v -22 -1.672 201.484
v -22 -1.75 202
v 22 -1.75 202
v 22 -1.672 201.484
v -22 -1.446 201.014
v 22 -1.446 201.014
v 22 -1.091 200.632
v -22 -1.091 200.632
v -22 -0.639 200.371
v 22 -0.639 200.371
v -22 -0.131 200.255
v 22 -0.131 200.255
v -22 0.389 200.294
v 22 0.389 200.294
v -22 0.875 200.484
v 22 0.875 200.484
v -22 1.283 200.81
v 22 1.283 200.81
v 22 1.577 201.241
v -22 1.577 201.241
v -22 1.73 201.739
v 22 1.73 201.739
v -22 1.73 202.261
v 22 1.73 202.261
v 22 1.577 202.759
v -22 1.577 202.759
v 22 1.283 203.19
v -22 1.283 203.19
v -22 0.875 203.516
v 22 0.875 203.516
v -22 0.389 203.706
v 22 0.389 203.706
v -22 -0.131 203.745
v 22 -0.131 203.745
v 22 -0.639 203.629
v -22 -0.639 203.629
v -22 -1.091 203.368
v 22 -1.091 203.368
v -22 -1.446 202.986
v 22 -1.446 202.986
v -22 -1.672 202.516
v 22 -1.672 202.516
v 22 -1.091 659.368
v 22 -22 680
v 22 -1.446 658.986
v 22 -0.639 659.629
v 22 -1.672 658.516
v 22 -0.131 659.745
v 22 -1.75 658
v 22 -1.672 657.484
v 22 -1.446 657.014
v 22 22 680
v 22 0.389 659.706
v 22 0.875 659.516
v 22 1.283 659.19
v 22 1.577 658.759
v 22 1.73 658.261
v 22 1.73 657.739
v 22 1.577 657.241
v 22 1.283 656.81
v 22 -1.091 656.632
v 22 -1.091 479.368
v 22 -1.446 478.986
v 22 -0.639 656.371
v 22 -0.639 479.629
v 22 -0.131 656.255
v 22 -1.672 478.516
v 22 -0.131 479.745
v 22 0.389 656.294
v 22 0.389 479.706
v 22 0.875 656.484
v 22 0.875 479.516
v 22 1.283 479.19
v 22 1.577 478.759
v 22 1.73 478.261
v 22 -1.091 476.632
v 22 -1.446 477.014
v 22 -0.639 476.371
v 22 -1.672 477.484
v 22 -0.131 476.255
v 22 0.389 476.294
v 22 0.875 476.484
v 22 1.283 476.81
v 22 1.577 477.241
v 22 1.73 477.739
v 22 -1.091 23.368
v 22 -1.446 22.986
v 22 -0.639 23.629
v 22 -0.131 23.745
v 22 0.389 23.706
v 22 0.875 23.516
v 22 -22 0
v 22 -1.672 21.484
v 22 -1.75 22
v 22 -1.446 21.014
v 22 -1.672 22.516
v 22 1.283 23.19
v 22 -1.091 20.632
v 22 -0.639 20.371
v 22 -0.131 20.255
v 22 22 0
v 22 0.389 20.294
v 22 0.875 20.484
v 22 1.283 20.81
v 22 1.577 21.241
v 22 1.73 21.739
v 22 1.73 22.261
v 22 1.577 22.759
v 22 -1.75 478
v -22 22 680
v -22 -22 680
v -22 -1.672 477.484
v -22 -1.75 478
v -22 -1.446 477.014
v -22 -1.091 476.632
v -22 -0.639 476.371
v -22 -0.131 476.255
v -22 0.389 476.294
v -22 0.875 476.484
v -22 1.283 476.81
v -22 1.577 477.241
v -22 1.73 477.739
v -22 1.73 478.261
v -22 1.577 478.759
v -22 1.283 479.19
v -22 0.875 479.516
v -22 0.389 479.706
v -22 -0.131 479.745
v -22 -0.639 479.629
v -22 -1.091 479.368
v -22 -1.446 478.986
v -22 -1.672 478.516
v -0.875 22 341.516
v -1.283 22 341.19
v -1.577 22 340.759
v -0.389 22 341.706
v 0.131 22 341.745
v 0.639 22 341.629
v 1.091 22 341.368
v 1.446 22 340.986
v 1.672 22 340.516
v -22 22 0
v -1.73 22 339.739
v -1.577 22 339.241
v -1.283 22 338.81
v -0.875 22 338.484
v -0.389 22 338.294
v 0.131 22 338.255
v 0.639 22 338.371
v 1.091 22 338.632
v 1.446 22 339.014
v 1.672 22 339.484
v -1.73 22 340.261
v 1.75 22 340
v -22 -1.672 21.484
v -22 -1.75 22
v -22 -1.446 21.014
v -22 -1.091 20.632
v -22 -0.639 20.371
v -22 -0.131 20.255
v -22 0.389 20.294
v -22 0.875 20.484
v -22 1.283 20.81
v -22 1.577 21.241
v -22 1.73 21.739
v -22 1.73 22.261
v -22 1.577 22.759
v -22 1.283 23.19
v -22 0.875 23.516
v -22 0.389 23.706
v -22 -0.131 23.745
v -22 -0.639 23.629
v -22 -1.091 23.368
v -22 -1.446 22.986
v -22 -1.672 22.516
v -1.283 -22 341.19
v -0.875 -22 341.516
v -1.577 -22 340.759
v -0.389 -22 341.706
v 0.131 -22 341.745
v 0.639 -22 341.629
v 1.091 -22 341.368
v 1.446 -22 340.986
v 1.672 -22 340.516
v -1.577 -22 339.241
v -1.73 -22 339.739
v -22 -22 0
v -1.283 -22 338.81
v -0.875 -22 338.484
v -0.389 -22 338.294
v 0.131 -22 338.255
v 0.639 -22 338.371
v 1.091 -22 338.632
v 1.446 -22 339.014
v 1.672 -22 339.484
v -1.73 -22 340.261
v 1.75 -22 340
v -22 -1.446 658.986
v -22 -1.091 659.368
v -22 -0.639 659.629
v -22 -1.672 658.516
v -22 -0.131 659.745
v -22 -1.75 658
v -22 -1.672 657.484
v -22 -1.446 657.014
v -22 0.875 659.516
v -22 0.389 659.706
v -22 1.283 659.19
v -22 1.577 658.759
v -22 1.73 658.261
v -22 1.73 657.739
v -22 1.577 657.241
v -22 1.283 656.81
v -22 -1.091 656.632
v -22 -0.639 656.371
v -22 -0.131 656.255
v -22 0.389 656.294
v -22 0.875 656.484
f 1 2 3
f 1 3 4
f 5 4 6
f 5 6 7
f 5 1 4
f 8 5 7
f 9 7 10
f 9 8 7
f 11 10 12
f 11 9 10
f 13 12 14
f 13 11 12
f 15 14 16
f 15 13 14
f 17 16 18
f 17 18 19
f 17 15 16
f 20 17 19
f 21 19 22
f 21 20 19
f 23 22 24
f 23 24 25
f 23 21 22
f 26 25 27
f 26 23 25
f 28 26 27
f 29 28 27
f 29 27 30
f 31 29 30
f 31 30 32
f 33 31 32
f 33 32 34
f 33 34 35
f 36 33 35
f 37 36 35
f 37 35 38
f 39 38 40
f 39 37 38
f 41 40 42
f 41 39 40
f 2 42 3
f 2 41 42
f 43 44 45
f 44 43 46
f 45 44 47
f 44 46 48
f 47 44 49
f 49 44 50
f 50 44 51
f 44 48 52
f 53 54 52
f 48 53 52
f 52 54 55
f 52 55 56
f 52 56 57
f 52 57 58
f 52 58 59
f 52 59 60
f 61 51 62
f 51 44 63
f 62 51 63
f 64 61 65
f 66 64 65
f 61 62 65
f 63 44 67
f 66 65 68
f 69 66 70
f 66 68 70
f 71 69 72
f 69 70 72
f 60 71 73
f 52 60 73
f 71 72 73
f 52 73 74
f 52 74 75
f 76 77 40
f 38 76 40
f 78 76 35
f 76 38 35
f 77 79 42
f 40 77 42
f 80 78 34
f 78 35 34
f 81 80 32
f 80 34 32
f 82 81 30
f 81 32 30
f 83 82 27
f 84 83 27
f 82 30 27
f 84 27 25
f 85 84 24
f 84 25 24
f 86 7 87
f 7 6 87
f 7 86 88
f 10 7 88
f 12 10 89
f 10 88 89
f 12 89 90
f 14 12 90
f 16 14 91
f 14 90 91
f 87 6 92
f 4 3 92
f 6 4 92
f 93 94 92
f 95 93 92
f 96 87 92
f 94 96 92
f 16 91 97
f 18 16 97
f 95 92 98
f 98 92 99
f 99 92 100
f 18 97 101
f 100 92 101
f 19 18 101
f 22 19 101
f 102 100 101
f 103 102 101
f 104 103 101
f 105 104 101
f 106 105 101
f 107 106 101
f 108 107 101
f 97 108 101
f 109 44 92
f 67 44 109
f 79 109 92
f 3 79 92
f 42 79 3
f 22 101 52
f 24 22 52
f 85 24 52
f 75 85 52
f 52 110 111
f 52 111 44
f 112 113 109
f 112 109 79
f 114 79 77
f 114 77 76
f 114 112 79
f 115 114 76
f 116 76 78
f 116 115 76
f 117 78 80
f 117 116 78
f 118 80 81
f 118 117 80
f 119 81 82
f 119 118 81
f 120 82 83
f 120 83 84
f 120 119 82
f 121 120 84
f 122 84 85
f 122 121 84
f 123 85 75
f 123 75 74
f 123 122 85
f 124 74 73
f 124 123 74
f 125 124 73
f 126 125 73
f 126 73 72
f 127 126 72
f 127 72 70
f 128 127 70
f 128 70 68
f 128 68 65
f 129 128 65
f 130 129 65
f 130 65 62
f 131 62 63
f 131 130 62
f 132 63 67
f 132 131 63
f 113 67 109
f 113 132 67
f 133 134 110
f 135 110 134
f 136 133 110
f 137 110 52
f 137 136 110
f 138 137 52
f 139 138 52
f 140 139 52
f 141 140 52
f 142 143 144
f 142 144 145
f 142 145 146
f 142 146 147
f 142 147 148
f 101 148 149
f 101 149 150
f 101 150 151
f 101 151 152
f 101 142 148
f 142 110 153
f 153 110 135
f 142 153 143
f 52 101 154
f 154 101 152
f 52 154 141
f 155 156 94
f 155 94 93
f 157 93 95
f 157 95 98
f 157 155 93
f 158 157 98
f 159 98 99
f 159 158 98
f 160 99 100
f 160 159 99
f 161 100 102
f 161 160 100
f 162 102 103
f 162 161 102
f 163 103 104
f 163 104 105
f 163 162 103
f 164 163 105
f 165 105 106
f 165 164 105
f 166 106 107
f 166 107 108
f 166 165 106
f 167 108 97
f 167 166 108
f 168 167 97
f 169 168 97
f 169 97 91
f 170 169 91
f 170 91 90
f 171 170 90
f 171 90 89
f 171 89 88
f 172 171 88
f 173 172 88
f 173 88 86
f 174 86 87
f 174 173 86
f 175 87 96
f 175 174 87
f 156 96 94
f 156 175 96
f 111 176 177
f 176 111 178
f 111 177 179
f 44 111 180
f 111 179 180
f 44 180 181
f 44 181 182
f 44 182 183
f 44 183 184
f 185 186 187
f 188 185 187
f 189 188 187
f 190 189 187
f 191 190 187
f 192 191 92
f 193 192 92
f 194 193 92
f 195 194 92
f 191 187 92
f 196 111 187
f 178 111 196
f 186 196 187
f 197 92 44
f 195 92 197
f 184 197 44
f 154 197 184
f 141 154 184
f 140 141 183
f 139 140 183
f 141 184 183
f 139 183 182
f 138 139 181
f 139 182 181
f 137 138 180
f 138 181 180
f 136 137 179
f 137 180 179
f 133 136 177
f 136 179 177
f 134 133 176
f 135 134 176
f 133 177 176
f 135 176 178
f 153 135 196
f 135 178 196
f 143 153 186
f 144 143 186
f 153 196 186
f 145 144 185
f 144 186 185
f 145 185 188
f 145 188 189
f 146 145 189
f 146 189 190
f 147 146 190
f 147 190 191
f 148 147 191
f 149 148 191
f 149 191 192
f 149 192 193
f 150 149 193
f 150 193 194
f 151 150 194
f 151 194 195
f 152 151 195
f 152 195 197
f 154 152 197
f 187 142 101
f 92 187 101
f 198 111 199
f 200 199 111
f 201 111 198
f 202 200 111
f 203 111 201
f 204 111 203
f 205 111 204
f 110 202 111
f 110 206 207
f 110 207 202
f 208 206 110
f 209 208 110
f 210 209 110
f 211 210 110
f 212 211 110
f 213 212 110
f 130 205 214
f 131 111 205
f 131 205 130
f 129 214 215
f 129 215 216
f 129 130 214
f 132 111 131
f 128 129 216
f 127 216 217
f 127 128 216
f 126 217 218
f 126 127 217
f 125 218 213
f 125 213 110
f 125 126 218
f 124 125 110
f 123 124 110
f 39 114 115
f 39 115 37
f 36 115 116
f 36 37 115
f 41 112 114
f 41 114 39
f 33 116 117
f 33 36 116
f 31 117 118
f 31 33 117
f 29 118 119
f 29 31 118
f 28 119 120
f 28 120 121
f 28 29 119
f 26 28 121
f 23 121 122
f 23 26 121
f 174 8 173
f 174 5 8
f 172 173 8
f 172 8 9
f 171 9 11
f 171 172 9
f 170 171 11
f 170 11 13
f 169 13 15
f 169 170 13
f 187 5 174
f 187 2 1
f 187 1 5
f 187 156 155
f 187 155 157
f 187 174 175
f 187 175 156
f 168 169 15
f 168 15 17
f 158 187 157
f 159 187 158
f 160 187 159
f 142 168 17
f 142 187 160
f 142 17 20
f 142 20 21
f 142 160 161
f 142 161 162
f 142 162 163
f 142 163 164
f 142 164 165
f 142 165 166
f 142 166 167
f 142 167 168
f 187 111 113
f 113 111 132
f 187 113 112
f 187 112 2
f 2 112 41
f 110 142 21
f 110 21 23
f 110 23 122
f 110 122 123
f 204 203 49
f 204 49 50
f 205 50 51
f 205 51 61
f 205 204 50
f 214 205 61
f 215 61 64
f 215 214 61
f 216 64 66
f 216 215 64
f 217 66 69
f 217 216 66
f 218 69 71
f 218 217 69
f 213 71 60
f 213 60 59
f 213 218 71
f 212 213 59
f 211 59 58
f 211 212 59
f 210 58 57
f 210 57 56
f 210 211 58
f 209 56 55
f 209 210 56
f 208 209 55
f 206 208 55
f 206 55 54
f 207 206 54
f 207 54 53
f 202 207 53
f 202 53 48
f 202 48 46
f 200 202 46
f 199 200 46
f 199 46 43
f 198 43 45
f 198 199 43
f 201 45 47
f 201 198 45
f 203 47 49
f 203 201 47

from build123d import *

# Parameters (mm, degrees)
ESQUISSE1_W             = 44
ESQUISSE1_H             = 44
BOSS_EXTRU_1_DEPTH      = 680
ESQUISSE2_R             = 1.75
ENL_V_MAT_EXTRU_1_DEPTH = 44
ESQUISSE3_R             = 1.75
ENL_V_MAT_EXTRU_2_DEPTH = 60


with BuildPart() as part:
    # Esquisse1 → Boss.-Extru.1 (new body)
    with BuildSketch(Plane.XY):
        Rectangle(ESQUISSE1_W, ESQUISSE1_H)
    extrude(amount=BOSS_EXTRU_1_DEPTH)

    # Esquisse2 → Enlèv. mat.-Extru.1 (cut)
    with BuildSketch(Plane(origin=(-22, 0, 0), x_dir=(0, -1, 0), z_dir=(1, 0, 0))):
        with Locations((0, -22)):
            Circle(ESQUISSE2_R)
        with Locations((0, -658)):
            Circle(ESQUISSE2_R)
        with Locations((0, -202)):
            Circle(ESQUISSE2_R)
        with Locations((0, -478)):
            Circle(ESQUISSE2_R)
    extrude(amount=ENL_V_MAT_EXTRU_1_DEPTH, mode=Mode.SUBTRACT)

    # Esquisse3 → Enlèv. mat.-Extru.2 (cut)
    with BuildSketch(Plane.XZ.offset(22)):
        with Locations((0, 340)):
            Circle(ESQUISSE3_R)
    extrude(amount=-ENL_V_MAT_EXTRU_2_DEPTH, mode=Mode.SUBTRACT)


solid = part.part
